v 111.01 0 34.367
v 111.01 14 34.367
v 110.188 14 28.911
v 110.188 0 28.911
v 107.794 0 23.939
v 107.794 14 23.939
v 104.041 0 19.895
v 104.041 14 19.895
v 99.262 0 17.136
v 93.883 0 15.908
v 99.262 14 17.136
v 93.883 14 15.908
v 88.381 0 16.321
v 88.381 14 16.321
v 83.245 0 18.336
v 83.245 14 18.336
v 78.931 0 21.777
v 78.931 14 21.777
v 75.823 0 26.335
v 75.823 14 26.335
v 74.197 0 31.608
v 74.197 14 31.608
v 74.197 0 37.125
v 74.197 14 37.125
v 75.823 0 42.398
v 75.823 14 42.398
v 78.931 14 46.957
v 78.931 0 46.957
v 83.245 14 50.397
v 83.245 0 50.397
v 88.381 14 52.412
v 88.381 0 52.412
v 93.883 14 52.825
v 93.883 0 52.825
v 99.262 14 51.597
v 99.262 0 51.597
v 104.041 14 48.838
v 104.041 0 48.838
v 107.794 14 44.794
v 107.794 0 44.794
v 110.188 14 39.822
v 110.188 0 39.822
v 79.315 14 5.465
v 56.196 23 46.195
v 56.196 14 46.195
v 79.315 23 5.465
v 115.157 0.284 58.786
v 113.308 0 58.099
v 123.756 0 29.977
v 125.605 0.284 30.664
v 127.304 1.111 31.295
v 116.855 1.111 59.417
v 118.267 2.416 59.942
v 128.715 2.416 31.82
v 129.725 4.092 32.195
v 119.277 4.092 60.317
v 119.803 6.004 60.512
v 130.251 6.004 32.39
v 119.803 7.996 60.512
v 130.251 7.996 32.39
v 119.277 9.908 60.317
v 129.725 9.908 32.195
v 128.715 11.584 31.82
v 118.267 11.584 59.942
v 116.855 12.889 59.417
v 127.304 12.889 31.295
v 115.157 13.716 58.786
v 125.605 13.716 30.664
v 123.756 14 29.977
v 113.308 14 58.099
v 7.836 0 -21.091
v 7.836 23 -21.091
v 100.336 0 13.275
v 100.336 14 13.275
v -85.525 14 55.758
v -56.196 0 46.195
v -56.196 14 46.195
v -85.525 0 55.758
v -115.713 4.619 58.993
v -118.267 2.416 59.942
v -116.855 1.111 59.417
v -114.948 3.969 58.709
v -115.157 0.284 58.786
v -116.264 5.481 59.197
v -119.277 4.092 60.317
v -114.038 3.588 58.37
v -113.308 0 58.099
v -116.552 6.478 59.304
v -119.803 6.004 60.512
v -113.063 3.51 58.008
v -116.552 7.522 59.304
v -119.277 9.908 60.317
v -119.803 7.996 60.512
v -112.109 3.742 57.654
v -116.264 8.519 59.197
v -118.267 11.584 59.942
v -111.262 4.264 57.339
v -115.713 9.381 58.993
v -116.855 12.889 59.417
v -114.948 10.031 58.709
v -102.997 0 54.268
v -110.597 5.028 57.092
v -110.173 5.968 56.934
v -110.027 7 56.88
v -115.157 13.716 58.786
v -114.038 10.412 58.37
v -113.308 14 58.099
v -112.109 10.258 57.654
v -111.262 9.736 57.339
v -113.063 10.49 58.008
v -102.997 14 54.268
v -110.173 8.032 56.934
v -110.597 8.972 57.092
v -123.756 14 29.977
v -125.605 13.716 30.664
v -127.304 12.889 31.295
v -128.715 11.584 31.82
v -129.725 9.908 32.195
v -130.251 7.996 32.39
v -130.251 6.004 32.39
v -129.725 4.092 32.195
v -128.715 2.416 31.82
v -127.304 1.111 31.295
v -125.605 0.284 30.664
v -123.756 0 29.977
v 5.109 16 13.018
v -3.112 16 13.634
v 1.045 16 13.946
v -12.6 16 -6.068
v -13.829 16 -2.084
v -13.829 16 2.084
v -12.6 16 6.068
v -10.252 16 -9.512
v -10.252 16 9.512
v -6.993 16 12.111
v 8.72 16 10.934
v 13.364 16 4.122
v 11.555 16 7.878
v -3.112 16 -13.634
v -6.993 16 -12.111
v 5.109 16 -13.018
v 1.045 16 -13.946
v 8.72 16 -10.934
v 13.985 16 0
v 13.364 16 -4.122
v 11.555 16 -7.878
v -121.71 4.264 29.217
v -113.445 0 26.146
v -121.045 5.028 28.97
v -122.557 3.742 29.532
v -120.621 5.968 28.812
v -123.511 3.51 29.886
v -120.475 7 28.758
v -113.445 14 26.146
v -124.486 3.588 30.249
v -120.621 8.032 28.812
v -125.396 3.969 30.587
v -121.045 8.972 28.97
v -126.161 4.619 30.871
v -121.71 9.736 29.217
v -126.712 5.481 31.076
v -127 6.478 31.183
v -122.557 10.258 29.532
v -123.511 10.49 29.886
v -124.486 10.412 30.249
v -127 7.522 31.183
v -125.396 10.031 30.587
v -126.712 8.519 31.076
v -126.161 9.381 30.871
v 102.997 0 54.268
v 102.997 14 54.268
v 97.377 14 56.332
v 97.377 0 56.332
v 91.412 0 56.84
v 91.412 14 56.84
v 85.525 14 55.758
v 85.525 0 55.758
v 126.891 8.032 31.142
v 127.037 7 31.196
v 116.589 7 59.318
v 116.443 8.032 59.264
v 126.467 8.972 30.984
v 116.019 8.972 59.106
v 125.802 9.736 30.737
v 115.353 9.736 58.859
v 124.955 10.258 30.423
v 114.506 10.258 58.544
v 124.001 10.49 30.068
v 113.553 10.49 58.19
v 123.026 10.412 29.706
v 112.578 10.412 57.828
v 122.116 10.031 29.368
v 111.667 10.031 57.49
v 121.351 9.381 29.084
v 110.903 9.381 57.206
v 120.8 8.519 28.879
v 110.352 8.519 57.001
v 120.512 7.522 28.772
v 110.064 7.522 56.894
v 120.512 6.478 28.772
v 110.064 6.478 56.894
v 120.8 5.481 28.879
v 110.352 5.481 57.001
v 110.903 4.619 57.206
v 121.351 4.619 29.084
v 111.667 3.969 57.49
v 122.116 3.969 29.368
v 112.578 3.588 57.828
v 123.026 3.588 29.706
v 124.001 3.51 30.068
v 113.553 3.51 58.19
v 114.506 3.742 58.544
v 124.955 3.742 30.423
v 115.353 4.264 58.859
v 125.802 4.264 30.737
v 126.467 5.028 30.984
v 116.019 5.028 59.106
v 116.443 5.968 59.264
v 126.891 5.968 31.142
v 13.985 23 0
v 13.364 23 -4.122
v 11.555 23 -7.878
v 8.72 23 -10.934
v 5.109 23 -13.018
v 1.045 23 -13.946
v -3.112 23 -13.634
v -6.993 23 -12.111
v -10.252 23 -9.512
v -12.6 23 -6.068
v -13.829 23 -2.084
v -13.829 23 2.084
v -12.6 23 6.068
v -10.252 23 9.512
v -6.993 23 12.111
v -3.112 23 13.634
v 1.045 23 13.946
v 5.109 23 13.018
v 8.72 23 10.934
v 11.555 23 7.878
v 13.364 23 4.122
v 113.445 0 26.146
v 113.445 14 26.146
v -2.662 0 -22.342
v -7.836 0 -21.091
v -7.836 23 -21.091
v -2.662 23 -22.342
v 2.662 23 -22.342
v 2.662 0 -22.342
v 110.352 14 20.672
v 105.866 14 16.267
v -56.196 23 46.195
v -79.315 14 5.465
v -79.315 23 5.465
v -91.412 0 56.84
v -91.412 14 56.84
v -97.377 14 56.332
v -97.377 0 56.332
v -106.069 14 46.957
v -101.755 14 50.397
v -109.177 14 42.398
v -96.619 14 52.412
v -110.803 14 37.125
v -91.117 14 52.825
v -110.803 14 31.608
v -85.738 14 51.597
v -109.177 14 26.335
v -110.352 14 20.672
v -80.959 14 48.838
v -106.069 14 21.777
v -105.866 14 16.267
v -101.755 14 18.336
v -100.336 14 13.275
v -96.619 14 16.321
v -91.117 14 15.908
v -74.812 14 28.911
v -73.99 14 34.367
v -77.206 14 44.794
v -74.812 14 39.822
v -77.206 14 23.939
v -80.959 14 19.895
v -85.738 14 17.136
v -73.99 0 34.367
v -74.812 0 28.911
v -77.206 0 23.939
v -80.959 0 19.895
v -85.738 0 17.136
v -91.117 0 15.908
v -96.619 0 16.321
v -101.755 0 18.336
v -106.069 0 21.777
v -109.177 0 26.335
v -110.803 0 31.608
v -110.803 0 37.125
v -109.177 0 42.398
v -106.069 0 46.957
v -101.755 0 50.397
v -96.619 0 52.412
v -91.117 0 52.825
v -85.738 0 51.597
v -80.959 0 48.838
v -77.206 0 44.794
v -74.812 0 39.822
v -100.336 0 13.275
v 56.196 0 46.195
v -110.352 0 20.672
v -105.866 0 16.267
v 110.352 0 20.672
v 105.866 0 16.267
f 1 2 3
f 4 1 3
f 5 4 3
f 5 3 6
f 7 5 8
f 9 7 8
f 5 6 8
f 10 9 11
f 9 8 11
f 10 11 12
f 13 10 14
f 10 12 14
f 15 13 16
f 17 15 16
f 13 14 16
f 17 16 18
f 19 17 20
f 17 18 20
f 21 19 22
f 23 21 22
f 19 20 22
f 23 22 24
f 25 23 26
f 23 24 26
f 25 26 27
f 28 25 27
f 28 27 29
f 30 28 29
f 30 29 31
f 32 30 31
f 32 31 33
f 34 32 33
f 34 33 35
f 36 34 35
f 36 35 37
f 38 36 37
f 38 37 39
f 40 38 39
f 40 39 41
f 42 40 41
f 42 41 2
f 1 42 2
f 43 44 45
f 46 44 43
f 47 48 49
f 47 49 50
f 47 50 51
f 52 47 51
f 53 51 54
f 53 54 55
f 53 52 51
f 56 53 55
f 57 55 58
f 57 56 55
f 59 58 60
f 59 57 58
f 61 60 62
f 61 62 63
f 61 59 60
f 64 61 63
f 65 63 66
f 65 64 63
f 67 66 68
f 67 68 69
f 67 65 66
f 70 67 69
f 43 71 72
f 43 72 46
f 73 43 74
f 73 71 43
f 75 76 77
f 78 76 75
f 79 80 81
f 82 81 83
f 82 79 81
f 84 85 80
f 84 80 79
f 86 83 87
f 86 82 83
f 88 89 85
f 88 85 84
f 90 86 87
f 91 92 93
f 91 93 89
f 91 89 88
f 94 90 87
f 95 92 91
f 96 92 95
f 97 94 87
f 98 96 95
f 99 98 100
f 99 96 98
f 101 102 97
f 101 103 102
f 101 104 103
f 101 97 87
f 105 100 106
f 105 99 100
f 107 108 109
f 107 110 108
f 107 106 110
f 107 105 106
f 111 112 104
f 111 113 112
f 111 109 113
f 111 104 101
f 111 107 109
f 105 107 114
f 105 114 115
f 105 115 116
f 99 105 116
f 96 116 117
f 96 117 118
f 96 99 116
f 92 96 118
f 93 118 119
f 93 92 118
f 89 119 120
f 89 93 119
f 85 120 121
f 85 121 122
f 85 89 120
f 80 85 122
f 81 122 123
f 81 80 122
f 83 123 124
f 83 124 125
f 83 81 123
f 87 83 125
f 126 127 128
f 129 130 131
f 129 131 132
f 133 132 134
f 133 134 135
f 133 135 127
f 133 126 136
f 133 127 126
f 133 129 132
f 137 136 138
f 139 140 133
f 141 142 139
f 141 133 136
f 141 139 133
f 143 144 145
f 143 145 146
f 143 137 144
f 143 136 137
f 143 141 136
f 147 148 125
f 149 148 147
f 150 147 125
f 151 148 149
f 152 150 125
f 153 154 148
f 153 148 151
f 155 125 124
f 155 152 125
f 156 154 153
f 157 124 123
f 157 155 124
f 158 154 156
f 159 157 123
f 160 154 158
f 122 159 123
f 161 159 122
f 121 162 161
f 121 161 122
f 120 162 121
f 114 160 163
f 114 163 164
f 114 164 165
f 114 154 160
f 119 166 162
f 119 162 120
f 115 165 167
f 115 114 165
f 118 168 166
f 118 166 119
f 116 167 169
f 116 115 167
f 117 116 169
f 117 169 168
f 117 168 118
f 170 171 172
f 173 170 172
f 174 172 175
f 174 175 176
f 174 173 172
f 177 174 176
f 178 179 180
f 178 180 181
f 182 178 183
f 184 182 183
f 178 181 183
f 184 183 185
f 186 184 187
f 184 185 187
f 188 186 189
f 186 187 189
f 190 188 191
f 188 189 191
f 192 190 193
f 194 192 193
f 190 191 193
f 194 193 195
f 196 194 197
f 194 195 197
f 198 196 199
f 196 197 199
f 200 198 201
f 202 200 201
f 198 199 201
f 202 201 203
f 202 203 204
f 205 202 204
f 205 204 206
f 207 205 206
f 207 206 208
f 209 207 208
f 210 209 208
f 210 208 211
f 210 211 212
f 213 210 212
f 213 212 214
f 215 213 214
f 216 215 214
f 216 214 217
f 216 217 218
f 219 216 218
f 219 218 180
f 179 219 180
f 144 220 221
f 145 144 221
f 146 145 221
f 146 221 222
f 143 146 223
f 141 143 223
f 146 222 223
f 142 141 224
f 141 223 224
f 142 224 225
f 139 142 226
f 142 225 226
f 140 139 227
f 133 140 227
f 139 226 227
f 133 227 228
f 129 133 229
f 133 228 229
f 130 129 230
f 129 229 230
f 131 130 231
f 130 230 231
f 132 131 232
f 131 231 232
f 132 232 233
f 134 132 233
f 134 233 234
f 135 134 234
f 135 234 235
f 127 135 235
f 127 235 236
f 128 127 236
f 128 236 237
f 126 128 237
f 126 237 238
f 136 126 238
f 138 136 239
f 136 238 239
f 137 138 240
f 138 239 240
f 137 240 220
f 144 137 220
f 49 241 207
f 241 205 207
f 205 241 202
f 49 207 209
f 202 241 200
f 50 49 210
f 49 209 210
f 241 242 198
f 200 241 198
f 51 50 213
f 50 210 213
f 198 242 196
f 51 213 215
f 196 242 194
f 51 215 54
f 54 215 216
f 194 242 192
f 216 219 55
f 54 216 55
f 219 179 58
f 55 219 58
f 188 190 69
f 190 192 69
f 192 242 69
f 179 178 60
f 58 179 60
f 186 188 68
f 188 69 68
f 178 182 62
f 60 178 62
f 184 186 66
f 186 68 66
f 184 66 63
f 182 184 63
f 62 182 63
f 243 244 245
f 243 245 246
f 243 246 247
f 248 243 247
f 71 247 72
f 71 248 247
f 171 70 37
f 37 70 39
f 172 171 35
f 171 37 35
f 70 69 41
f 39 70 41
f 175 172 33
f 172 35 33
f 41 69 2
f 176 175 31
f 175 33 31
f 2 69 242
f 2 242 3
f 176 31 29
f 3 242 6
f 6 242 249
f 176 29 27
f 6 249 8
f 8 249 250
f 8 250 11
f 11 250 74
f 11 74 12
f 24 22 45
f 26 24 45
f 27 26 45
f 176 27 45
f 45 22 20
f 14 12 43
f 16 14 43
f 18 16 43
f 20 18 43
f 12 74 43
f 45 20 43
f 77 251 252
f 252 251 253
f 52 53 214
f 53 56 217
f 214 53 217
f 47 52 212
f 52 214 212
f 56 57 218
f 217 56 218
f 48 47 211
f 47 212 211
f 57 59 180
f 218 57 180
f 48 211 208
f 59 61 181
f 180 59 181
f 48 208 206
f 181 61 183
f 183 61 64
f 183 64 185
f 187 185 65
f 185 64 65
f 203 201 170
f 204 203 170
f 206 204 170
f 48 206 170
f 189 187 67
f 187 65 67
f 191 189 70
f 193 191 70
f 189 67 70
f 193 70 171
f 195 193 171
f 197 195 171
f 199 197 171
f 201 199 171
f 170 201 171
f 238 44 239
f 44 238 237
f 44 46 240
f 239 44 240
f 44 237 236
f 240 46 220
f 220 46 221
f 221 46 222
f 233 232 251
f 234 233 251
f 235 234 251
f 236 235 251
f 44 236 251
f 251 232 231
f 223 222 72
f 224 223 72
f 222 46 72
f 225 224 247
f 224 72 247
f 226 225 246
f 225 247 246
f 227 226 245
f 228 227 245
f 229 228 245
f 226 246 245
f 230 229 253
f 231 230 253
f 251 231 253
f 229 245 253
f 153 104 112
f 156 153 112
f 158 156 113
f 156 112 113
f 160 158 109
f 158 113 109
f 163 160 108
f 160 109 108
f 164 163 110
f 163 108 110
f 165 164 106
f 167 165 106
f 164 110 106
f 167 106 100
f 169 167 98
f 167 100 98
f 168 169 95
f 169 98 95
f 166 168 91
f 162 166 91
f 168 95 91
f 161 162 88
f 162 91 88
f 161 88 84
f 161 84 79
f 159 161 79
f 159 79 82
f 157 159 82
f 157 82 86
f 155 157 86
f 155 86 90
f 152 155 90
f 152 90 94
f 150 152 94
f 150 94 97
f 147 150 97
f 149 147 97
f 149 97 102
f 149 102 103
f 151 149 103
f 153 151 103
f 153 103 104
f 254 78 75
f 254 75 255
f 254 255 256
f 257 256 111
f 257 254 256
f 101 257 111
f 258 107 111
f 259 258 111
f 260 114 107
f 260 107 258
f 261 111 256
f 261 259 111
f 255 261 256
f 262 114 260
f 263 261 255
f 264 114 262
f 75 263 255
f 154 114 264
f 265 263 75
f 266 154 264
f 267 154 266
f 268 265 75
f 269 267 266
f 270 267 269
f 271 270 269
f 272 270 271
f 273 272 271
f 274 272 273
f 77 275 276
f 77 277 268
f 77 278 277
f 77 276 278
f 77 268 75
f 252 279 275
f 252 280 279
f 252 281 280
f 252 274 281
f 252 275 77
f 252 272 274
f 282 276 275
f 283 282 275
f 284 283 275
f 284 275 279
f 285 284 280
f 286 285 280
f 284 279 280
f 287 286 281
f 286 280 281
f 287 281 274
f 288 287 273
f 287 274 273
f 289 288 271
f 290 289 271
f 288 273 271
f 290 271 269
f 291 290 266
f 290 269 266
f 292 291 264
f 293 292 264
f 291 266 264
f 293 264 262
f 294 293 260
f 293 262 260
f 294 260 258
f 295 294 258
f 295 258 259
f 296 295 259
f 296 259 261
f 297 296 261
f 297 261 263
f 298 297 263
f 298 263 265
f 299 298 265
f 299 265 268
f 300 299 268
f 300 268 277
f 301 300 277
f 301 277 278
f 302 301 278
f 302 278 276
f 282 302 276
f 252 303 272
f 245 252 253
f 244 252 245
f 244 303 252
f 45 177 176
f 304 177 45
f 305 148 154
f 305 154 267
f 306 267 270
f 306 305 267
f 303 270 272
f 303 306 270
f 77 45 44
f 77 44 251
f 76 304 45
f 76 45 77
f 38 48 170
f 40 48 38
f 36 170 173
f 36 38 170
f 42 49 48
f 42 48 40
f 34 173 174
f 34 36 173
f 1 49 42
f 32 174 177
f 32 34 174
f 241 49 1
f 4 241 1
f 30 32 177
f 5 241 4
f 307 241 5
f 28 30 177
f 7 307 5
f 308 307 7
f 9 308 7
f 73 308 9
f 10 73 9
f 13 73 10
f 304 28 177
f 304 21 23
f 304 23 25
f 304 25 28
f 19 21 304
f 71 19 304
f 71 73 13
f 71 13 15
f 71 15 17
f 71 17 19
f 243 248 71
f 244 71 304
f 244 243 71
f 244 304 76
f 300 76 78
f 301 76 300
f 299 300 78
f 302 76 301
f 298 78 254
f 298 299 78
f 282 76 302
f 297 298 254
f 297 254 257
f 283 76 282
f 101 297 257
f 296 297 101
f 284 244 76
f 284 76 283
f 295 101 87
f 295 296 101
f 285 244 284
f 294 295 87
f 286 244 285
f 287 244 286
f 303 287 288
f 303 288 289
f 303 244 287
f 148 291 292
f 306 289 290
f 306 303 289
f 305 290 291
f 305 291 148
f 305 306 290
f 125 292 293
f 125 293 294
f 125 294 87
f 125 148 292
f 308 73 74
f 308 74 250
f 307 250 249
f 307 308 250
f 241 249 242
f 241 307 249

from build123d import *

# Parameters (mm, degrees)
BOSS_EXTRUDE1_DEPTH = 23
SKETCH2_R           = 18.51
CUT_EXTRUDE1_DEPTH  = 24
SKETCH3_R           = 13.985
CUT_EXTRUDE2_DEPTH  = 7
BOSS_EXTRUDE2_DEPTH = 23
CUT_EXTRUDE3_DEPTH  = 83.130091318
SKETCH10_R          = 3.5
CUT_EXTRUDE5_DEPTH  = 42
CUT_EXTRUDE8_DEPTH  = 83.130091318
CUT_EXTRUDE9_DEPTH  = 9
SKETCH15_R          = 3.5
CUT_EXTRUDE10_DEPTH = 82.477158286


with BuildPart() as part:
    # Sketch1 → Boss-Extrude1 (new body)
    with BuildSketch(Plane(origin=(0, 0, 0), x_dir=(1, 0, 0), z_dir=(0, 1, 0))):
        with BuildLine():
            Line((-100.336081003, -13.275177251), (-7.836081003, 21.091368721))
            ThreePointArc((-7.836081003, 21.091368721), (0, 22.5), (7.836081003, 21.091368721))
            Line((7.836081003, 21.091368721), (100.336081003, -13.275177251))
            ThreePointArc((100.336081003, -13.275177251), (113.745786388, -41.773742524), (85.524728129, -55.758029845))
            Line((85.524728129, -55.758029845), (56.196116933, -46.194642944))
            Line((56.196116933, -46.194642944), (-56.196116933, -46.194642944))
            Line((-56.196116933, -46.194642944), (-85.524728129, -55.758029845))
            ThreePointArc((-85.524728129, -55.758029845), (-113.745786388, -41.773742524), (-100.336081003, -13.275177251))
        make_face()
    extrude(amount=BOSS_EXTRUDE1_DEPTH)

    # Sketch2 → Cut-Extrude1 (cut, through all)
    with BuildSketch(Plane(origin=(0, 23, 0), x_dir=(1, 0, 0), z_dir=(0, 1, 0))):
        with Locations((-92.5, -34.366545972)):
            Circle(SKETCH2_R)
        with Locations((92.5, -34.366545972)):
            Circle(SKETCH2_R)
    extrude(amount=-CUT_EXTRUDE1_DEPTH, mode=Mode.SUBTRACT)

    # Sketch3 → Cut-Extrude2 (cut)
    with BuildSketch(Plane(origin=(0, 23, 0), x_dir=(1, 0, 0), z_dir=(0, 1, 0))):
        Circle(SKETCH3_R)
    extrude(amount=-CUT_EXTRUDE2_DEPTH, mode=Mode.SUBTRACT)

    # Sketch4 → Boss-Extrude2 (add)
    with BuildSketch(Plane(origin=(0, 23, 0), x_dir=(1, 0, 0), z_dir=(0, 1, 0))):
        with BuildLine():
            Line((-113.444632068, -26.146303424), (-132.192515375, -33.11170876))
            Line((-132.192515375, -33.11170876), (-121.744407372, -61.233533721))
            Line((-121.744407372, -61.233533721), (-102.996524064, -54.268128385))
            ThreePointArc((-102.996524064, -54.268128385), (-113.591368721, -42.202626974), (-113.444632068, -26.146303424))
        make_face()
        with BuildLine():
            Line((113.444632068, -26.146303424), (132.192515375, -33.11170876))
            Line((132.192515375, -33.11170876), (121.744407372, -61.233533721))
            Line((121.744407372, -61.233533721), (102.996524064, -54.268128385))
            ThreePointArc((102.996524064, -54.268128385), (113.591368721, -42.202626974), (113.444632068, -26.146303424))
        make_face()
    extrude(amount=-BOSS_EXTRUDE2_DEPTH)

    # Sketch5 → Cut-Extrude3 (cut, through all)
    with BuildSketch(Plane(origin=(5.224054002, 0, 14.060912481), x_dir=(0.937394165, 0, -0.348270267), z_dir=(0.348270267, 0, 0.937394165))):
        with BuildLine():
            Line((-135.448316262, 0), (-135.448316262, 14))
            Line((-135.448316262, 14), (-126.448316262, 14))
            ThreePointArc((-126.448316262, 14), (-133.448316262, 7), (-126.448316262, 0))
            Line((-126.448316262, 0), (-135.448316262, 0))
        make_face()
    extrude(amount=-CUT_EXTRUDE3_DEPTH, mode=Mode.SUBTRACT)

    # Sketch10 → Cut-Extrude5 (cut)
    with BuildSketch(Plane(origin=(5.224054002, 0, 14.060912481), x_dir=(0.937394165, 0, -0.348270267), z_dir=(0.348270267, 0, 0.937394165))):
        with Locations((-126.448316262, 7)):
            Circle(SKETCH10_R)
    extrude(amount=-CUT_EXTRUDE5_DEPTH, mode=Mode.SUBTRACT)

    # Sketch13 → Cut-Extrude8 (cut, through all)
    with BuildSketch(Plane(origin=(-5.224054002, 0, 14.060912481), x_dir=(0.937394165, 0, 0.348270267), z_dir=(-0.348270267, 0, 0.937394165))):
        with BuildLine():
            Line((126.448316262, 14), (135.448316262, 14))
            Line((135.448316262, 14), (135.448316262, 0))
            Line((135.448316262, 0), (126.448316262, 0))
            ThreePointArc((126.448316262, 0), (133.448316262, 7), (126.448316262, 14))
        make_face()
    extrude(amount=-CUT_EXTRUDE8_DEPTH, mode=Mode.SUBTRACT)

    # Sketch14 → Cut-Extrude9 (cut)
    with BuildSketch(Plane(origin=(0, 23, 0), x_dir=(1, 0, 0), z_dir=(0, 1, 0))):
        Polygon((-56.196116933, -46.194642944), (-93.033770242, 18.702535116), (-179.483612129, -24.236128073), (-123.538544412, -84.420295749), align=None)
        Polygon((179.483612129, -24.236128073), (123.538544412, -84.420295749), (56.196116933, -46.194642944), (93.033770242, 18.702535116), align=None)
    extrude(amount=-CUT_EXTRUDE9_DEPTH, mode=Mode.SUBTRACT)

    # Sketch15 → Cut-Extrude10 (cut, through all)
    with BuildSketch(Plane(origin=(-5.224054002, 0, 14.060912481), x_dir=(0.937394165, 0, 0.348270267), z_dir=(-0.348270267, 0, 0.937394165))):
        with Locations((126.448316262, 7)):
            Circle(SKETCH15_R)
    extrude(amount=-CUT_EXTRUDE10_DEPTH, mode=Mode.SUBTRACT)


solid = part.part
